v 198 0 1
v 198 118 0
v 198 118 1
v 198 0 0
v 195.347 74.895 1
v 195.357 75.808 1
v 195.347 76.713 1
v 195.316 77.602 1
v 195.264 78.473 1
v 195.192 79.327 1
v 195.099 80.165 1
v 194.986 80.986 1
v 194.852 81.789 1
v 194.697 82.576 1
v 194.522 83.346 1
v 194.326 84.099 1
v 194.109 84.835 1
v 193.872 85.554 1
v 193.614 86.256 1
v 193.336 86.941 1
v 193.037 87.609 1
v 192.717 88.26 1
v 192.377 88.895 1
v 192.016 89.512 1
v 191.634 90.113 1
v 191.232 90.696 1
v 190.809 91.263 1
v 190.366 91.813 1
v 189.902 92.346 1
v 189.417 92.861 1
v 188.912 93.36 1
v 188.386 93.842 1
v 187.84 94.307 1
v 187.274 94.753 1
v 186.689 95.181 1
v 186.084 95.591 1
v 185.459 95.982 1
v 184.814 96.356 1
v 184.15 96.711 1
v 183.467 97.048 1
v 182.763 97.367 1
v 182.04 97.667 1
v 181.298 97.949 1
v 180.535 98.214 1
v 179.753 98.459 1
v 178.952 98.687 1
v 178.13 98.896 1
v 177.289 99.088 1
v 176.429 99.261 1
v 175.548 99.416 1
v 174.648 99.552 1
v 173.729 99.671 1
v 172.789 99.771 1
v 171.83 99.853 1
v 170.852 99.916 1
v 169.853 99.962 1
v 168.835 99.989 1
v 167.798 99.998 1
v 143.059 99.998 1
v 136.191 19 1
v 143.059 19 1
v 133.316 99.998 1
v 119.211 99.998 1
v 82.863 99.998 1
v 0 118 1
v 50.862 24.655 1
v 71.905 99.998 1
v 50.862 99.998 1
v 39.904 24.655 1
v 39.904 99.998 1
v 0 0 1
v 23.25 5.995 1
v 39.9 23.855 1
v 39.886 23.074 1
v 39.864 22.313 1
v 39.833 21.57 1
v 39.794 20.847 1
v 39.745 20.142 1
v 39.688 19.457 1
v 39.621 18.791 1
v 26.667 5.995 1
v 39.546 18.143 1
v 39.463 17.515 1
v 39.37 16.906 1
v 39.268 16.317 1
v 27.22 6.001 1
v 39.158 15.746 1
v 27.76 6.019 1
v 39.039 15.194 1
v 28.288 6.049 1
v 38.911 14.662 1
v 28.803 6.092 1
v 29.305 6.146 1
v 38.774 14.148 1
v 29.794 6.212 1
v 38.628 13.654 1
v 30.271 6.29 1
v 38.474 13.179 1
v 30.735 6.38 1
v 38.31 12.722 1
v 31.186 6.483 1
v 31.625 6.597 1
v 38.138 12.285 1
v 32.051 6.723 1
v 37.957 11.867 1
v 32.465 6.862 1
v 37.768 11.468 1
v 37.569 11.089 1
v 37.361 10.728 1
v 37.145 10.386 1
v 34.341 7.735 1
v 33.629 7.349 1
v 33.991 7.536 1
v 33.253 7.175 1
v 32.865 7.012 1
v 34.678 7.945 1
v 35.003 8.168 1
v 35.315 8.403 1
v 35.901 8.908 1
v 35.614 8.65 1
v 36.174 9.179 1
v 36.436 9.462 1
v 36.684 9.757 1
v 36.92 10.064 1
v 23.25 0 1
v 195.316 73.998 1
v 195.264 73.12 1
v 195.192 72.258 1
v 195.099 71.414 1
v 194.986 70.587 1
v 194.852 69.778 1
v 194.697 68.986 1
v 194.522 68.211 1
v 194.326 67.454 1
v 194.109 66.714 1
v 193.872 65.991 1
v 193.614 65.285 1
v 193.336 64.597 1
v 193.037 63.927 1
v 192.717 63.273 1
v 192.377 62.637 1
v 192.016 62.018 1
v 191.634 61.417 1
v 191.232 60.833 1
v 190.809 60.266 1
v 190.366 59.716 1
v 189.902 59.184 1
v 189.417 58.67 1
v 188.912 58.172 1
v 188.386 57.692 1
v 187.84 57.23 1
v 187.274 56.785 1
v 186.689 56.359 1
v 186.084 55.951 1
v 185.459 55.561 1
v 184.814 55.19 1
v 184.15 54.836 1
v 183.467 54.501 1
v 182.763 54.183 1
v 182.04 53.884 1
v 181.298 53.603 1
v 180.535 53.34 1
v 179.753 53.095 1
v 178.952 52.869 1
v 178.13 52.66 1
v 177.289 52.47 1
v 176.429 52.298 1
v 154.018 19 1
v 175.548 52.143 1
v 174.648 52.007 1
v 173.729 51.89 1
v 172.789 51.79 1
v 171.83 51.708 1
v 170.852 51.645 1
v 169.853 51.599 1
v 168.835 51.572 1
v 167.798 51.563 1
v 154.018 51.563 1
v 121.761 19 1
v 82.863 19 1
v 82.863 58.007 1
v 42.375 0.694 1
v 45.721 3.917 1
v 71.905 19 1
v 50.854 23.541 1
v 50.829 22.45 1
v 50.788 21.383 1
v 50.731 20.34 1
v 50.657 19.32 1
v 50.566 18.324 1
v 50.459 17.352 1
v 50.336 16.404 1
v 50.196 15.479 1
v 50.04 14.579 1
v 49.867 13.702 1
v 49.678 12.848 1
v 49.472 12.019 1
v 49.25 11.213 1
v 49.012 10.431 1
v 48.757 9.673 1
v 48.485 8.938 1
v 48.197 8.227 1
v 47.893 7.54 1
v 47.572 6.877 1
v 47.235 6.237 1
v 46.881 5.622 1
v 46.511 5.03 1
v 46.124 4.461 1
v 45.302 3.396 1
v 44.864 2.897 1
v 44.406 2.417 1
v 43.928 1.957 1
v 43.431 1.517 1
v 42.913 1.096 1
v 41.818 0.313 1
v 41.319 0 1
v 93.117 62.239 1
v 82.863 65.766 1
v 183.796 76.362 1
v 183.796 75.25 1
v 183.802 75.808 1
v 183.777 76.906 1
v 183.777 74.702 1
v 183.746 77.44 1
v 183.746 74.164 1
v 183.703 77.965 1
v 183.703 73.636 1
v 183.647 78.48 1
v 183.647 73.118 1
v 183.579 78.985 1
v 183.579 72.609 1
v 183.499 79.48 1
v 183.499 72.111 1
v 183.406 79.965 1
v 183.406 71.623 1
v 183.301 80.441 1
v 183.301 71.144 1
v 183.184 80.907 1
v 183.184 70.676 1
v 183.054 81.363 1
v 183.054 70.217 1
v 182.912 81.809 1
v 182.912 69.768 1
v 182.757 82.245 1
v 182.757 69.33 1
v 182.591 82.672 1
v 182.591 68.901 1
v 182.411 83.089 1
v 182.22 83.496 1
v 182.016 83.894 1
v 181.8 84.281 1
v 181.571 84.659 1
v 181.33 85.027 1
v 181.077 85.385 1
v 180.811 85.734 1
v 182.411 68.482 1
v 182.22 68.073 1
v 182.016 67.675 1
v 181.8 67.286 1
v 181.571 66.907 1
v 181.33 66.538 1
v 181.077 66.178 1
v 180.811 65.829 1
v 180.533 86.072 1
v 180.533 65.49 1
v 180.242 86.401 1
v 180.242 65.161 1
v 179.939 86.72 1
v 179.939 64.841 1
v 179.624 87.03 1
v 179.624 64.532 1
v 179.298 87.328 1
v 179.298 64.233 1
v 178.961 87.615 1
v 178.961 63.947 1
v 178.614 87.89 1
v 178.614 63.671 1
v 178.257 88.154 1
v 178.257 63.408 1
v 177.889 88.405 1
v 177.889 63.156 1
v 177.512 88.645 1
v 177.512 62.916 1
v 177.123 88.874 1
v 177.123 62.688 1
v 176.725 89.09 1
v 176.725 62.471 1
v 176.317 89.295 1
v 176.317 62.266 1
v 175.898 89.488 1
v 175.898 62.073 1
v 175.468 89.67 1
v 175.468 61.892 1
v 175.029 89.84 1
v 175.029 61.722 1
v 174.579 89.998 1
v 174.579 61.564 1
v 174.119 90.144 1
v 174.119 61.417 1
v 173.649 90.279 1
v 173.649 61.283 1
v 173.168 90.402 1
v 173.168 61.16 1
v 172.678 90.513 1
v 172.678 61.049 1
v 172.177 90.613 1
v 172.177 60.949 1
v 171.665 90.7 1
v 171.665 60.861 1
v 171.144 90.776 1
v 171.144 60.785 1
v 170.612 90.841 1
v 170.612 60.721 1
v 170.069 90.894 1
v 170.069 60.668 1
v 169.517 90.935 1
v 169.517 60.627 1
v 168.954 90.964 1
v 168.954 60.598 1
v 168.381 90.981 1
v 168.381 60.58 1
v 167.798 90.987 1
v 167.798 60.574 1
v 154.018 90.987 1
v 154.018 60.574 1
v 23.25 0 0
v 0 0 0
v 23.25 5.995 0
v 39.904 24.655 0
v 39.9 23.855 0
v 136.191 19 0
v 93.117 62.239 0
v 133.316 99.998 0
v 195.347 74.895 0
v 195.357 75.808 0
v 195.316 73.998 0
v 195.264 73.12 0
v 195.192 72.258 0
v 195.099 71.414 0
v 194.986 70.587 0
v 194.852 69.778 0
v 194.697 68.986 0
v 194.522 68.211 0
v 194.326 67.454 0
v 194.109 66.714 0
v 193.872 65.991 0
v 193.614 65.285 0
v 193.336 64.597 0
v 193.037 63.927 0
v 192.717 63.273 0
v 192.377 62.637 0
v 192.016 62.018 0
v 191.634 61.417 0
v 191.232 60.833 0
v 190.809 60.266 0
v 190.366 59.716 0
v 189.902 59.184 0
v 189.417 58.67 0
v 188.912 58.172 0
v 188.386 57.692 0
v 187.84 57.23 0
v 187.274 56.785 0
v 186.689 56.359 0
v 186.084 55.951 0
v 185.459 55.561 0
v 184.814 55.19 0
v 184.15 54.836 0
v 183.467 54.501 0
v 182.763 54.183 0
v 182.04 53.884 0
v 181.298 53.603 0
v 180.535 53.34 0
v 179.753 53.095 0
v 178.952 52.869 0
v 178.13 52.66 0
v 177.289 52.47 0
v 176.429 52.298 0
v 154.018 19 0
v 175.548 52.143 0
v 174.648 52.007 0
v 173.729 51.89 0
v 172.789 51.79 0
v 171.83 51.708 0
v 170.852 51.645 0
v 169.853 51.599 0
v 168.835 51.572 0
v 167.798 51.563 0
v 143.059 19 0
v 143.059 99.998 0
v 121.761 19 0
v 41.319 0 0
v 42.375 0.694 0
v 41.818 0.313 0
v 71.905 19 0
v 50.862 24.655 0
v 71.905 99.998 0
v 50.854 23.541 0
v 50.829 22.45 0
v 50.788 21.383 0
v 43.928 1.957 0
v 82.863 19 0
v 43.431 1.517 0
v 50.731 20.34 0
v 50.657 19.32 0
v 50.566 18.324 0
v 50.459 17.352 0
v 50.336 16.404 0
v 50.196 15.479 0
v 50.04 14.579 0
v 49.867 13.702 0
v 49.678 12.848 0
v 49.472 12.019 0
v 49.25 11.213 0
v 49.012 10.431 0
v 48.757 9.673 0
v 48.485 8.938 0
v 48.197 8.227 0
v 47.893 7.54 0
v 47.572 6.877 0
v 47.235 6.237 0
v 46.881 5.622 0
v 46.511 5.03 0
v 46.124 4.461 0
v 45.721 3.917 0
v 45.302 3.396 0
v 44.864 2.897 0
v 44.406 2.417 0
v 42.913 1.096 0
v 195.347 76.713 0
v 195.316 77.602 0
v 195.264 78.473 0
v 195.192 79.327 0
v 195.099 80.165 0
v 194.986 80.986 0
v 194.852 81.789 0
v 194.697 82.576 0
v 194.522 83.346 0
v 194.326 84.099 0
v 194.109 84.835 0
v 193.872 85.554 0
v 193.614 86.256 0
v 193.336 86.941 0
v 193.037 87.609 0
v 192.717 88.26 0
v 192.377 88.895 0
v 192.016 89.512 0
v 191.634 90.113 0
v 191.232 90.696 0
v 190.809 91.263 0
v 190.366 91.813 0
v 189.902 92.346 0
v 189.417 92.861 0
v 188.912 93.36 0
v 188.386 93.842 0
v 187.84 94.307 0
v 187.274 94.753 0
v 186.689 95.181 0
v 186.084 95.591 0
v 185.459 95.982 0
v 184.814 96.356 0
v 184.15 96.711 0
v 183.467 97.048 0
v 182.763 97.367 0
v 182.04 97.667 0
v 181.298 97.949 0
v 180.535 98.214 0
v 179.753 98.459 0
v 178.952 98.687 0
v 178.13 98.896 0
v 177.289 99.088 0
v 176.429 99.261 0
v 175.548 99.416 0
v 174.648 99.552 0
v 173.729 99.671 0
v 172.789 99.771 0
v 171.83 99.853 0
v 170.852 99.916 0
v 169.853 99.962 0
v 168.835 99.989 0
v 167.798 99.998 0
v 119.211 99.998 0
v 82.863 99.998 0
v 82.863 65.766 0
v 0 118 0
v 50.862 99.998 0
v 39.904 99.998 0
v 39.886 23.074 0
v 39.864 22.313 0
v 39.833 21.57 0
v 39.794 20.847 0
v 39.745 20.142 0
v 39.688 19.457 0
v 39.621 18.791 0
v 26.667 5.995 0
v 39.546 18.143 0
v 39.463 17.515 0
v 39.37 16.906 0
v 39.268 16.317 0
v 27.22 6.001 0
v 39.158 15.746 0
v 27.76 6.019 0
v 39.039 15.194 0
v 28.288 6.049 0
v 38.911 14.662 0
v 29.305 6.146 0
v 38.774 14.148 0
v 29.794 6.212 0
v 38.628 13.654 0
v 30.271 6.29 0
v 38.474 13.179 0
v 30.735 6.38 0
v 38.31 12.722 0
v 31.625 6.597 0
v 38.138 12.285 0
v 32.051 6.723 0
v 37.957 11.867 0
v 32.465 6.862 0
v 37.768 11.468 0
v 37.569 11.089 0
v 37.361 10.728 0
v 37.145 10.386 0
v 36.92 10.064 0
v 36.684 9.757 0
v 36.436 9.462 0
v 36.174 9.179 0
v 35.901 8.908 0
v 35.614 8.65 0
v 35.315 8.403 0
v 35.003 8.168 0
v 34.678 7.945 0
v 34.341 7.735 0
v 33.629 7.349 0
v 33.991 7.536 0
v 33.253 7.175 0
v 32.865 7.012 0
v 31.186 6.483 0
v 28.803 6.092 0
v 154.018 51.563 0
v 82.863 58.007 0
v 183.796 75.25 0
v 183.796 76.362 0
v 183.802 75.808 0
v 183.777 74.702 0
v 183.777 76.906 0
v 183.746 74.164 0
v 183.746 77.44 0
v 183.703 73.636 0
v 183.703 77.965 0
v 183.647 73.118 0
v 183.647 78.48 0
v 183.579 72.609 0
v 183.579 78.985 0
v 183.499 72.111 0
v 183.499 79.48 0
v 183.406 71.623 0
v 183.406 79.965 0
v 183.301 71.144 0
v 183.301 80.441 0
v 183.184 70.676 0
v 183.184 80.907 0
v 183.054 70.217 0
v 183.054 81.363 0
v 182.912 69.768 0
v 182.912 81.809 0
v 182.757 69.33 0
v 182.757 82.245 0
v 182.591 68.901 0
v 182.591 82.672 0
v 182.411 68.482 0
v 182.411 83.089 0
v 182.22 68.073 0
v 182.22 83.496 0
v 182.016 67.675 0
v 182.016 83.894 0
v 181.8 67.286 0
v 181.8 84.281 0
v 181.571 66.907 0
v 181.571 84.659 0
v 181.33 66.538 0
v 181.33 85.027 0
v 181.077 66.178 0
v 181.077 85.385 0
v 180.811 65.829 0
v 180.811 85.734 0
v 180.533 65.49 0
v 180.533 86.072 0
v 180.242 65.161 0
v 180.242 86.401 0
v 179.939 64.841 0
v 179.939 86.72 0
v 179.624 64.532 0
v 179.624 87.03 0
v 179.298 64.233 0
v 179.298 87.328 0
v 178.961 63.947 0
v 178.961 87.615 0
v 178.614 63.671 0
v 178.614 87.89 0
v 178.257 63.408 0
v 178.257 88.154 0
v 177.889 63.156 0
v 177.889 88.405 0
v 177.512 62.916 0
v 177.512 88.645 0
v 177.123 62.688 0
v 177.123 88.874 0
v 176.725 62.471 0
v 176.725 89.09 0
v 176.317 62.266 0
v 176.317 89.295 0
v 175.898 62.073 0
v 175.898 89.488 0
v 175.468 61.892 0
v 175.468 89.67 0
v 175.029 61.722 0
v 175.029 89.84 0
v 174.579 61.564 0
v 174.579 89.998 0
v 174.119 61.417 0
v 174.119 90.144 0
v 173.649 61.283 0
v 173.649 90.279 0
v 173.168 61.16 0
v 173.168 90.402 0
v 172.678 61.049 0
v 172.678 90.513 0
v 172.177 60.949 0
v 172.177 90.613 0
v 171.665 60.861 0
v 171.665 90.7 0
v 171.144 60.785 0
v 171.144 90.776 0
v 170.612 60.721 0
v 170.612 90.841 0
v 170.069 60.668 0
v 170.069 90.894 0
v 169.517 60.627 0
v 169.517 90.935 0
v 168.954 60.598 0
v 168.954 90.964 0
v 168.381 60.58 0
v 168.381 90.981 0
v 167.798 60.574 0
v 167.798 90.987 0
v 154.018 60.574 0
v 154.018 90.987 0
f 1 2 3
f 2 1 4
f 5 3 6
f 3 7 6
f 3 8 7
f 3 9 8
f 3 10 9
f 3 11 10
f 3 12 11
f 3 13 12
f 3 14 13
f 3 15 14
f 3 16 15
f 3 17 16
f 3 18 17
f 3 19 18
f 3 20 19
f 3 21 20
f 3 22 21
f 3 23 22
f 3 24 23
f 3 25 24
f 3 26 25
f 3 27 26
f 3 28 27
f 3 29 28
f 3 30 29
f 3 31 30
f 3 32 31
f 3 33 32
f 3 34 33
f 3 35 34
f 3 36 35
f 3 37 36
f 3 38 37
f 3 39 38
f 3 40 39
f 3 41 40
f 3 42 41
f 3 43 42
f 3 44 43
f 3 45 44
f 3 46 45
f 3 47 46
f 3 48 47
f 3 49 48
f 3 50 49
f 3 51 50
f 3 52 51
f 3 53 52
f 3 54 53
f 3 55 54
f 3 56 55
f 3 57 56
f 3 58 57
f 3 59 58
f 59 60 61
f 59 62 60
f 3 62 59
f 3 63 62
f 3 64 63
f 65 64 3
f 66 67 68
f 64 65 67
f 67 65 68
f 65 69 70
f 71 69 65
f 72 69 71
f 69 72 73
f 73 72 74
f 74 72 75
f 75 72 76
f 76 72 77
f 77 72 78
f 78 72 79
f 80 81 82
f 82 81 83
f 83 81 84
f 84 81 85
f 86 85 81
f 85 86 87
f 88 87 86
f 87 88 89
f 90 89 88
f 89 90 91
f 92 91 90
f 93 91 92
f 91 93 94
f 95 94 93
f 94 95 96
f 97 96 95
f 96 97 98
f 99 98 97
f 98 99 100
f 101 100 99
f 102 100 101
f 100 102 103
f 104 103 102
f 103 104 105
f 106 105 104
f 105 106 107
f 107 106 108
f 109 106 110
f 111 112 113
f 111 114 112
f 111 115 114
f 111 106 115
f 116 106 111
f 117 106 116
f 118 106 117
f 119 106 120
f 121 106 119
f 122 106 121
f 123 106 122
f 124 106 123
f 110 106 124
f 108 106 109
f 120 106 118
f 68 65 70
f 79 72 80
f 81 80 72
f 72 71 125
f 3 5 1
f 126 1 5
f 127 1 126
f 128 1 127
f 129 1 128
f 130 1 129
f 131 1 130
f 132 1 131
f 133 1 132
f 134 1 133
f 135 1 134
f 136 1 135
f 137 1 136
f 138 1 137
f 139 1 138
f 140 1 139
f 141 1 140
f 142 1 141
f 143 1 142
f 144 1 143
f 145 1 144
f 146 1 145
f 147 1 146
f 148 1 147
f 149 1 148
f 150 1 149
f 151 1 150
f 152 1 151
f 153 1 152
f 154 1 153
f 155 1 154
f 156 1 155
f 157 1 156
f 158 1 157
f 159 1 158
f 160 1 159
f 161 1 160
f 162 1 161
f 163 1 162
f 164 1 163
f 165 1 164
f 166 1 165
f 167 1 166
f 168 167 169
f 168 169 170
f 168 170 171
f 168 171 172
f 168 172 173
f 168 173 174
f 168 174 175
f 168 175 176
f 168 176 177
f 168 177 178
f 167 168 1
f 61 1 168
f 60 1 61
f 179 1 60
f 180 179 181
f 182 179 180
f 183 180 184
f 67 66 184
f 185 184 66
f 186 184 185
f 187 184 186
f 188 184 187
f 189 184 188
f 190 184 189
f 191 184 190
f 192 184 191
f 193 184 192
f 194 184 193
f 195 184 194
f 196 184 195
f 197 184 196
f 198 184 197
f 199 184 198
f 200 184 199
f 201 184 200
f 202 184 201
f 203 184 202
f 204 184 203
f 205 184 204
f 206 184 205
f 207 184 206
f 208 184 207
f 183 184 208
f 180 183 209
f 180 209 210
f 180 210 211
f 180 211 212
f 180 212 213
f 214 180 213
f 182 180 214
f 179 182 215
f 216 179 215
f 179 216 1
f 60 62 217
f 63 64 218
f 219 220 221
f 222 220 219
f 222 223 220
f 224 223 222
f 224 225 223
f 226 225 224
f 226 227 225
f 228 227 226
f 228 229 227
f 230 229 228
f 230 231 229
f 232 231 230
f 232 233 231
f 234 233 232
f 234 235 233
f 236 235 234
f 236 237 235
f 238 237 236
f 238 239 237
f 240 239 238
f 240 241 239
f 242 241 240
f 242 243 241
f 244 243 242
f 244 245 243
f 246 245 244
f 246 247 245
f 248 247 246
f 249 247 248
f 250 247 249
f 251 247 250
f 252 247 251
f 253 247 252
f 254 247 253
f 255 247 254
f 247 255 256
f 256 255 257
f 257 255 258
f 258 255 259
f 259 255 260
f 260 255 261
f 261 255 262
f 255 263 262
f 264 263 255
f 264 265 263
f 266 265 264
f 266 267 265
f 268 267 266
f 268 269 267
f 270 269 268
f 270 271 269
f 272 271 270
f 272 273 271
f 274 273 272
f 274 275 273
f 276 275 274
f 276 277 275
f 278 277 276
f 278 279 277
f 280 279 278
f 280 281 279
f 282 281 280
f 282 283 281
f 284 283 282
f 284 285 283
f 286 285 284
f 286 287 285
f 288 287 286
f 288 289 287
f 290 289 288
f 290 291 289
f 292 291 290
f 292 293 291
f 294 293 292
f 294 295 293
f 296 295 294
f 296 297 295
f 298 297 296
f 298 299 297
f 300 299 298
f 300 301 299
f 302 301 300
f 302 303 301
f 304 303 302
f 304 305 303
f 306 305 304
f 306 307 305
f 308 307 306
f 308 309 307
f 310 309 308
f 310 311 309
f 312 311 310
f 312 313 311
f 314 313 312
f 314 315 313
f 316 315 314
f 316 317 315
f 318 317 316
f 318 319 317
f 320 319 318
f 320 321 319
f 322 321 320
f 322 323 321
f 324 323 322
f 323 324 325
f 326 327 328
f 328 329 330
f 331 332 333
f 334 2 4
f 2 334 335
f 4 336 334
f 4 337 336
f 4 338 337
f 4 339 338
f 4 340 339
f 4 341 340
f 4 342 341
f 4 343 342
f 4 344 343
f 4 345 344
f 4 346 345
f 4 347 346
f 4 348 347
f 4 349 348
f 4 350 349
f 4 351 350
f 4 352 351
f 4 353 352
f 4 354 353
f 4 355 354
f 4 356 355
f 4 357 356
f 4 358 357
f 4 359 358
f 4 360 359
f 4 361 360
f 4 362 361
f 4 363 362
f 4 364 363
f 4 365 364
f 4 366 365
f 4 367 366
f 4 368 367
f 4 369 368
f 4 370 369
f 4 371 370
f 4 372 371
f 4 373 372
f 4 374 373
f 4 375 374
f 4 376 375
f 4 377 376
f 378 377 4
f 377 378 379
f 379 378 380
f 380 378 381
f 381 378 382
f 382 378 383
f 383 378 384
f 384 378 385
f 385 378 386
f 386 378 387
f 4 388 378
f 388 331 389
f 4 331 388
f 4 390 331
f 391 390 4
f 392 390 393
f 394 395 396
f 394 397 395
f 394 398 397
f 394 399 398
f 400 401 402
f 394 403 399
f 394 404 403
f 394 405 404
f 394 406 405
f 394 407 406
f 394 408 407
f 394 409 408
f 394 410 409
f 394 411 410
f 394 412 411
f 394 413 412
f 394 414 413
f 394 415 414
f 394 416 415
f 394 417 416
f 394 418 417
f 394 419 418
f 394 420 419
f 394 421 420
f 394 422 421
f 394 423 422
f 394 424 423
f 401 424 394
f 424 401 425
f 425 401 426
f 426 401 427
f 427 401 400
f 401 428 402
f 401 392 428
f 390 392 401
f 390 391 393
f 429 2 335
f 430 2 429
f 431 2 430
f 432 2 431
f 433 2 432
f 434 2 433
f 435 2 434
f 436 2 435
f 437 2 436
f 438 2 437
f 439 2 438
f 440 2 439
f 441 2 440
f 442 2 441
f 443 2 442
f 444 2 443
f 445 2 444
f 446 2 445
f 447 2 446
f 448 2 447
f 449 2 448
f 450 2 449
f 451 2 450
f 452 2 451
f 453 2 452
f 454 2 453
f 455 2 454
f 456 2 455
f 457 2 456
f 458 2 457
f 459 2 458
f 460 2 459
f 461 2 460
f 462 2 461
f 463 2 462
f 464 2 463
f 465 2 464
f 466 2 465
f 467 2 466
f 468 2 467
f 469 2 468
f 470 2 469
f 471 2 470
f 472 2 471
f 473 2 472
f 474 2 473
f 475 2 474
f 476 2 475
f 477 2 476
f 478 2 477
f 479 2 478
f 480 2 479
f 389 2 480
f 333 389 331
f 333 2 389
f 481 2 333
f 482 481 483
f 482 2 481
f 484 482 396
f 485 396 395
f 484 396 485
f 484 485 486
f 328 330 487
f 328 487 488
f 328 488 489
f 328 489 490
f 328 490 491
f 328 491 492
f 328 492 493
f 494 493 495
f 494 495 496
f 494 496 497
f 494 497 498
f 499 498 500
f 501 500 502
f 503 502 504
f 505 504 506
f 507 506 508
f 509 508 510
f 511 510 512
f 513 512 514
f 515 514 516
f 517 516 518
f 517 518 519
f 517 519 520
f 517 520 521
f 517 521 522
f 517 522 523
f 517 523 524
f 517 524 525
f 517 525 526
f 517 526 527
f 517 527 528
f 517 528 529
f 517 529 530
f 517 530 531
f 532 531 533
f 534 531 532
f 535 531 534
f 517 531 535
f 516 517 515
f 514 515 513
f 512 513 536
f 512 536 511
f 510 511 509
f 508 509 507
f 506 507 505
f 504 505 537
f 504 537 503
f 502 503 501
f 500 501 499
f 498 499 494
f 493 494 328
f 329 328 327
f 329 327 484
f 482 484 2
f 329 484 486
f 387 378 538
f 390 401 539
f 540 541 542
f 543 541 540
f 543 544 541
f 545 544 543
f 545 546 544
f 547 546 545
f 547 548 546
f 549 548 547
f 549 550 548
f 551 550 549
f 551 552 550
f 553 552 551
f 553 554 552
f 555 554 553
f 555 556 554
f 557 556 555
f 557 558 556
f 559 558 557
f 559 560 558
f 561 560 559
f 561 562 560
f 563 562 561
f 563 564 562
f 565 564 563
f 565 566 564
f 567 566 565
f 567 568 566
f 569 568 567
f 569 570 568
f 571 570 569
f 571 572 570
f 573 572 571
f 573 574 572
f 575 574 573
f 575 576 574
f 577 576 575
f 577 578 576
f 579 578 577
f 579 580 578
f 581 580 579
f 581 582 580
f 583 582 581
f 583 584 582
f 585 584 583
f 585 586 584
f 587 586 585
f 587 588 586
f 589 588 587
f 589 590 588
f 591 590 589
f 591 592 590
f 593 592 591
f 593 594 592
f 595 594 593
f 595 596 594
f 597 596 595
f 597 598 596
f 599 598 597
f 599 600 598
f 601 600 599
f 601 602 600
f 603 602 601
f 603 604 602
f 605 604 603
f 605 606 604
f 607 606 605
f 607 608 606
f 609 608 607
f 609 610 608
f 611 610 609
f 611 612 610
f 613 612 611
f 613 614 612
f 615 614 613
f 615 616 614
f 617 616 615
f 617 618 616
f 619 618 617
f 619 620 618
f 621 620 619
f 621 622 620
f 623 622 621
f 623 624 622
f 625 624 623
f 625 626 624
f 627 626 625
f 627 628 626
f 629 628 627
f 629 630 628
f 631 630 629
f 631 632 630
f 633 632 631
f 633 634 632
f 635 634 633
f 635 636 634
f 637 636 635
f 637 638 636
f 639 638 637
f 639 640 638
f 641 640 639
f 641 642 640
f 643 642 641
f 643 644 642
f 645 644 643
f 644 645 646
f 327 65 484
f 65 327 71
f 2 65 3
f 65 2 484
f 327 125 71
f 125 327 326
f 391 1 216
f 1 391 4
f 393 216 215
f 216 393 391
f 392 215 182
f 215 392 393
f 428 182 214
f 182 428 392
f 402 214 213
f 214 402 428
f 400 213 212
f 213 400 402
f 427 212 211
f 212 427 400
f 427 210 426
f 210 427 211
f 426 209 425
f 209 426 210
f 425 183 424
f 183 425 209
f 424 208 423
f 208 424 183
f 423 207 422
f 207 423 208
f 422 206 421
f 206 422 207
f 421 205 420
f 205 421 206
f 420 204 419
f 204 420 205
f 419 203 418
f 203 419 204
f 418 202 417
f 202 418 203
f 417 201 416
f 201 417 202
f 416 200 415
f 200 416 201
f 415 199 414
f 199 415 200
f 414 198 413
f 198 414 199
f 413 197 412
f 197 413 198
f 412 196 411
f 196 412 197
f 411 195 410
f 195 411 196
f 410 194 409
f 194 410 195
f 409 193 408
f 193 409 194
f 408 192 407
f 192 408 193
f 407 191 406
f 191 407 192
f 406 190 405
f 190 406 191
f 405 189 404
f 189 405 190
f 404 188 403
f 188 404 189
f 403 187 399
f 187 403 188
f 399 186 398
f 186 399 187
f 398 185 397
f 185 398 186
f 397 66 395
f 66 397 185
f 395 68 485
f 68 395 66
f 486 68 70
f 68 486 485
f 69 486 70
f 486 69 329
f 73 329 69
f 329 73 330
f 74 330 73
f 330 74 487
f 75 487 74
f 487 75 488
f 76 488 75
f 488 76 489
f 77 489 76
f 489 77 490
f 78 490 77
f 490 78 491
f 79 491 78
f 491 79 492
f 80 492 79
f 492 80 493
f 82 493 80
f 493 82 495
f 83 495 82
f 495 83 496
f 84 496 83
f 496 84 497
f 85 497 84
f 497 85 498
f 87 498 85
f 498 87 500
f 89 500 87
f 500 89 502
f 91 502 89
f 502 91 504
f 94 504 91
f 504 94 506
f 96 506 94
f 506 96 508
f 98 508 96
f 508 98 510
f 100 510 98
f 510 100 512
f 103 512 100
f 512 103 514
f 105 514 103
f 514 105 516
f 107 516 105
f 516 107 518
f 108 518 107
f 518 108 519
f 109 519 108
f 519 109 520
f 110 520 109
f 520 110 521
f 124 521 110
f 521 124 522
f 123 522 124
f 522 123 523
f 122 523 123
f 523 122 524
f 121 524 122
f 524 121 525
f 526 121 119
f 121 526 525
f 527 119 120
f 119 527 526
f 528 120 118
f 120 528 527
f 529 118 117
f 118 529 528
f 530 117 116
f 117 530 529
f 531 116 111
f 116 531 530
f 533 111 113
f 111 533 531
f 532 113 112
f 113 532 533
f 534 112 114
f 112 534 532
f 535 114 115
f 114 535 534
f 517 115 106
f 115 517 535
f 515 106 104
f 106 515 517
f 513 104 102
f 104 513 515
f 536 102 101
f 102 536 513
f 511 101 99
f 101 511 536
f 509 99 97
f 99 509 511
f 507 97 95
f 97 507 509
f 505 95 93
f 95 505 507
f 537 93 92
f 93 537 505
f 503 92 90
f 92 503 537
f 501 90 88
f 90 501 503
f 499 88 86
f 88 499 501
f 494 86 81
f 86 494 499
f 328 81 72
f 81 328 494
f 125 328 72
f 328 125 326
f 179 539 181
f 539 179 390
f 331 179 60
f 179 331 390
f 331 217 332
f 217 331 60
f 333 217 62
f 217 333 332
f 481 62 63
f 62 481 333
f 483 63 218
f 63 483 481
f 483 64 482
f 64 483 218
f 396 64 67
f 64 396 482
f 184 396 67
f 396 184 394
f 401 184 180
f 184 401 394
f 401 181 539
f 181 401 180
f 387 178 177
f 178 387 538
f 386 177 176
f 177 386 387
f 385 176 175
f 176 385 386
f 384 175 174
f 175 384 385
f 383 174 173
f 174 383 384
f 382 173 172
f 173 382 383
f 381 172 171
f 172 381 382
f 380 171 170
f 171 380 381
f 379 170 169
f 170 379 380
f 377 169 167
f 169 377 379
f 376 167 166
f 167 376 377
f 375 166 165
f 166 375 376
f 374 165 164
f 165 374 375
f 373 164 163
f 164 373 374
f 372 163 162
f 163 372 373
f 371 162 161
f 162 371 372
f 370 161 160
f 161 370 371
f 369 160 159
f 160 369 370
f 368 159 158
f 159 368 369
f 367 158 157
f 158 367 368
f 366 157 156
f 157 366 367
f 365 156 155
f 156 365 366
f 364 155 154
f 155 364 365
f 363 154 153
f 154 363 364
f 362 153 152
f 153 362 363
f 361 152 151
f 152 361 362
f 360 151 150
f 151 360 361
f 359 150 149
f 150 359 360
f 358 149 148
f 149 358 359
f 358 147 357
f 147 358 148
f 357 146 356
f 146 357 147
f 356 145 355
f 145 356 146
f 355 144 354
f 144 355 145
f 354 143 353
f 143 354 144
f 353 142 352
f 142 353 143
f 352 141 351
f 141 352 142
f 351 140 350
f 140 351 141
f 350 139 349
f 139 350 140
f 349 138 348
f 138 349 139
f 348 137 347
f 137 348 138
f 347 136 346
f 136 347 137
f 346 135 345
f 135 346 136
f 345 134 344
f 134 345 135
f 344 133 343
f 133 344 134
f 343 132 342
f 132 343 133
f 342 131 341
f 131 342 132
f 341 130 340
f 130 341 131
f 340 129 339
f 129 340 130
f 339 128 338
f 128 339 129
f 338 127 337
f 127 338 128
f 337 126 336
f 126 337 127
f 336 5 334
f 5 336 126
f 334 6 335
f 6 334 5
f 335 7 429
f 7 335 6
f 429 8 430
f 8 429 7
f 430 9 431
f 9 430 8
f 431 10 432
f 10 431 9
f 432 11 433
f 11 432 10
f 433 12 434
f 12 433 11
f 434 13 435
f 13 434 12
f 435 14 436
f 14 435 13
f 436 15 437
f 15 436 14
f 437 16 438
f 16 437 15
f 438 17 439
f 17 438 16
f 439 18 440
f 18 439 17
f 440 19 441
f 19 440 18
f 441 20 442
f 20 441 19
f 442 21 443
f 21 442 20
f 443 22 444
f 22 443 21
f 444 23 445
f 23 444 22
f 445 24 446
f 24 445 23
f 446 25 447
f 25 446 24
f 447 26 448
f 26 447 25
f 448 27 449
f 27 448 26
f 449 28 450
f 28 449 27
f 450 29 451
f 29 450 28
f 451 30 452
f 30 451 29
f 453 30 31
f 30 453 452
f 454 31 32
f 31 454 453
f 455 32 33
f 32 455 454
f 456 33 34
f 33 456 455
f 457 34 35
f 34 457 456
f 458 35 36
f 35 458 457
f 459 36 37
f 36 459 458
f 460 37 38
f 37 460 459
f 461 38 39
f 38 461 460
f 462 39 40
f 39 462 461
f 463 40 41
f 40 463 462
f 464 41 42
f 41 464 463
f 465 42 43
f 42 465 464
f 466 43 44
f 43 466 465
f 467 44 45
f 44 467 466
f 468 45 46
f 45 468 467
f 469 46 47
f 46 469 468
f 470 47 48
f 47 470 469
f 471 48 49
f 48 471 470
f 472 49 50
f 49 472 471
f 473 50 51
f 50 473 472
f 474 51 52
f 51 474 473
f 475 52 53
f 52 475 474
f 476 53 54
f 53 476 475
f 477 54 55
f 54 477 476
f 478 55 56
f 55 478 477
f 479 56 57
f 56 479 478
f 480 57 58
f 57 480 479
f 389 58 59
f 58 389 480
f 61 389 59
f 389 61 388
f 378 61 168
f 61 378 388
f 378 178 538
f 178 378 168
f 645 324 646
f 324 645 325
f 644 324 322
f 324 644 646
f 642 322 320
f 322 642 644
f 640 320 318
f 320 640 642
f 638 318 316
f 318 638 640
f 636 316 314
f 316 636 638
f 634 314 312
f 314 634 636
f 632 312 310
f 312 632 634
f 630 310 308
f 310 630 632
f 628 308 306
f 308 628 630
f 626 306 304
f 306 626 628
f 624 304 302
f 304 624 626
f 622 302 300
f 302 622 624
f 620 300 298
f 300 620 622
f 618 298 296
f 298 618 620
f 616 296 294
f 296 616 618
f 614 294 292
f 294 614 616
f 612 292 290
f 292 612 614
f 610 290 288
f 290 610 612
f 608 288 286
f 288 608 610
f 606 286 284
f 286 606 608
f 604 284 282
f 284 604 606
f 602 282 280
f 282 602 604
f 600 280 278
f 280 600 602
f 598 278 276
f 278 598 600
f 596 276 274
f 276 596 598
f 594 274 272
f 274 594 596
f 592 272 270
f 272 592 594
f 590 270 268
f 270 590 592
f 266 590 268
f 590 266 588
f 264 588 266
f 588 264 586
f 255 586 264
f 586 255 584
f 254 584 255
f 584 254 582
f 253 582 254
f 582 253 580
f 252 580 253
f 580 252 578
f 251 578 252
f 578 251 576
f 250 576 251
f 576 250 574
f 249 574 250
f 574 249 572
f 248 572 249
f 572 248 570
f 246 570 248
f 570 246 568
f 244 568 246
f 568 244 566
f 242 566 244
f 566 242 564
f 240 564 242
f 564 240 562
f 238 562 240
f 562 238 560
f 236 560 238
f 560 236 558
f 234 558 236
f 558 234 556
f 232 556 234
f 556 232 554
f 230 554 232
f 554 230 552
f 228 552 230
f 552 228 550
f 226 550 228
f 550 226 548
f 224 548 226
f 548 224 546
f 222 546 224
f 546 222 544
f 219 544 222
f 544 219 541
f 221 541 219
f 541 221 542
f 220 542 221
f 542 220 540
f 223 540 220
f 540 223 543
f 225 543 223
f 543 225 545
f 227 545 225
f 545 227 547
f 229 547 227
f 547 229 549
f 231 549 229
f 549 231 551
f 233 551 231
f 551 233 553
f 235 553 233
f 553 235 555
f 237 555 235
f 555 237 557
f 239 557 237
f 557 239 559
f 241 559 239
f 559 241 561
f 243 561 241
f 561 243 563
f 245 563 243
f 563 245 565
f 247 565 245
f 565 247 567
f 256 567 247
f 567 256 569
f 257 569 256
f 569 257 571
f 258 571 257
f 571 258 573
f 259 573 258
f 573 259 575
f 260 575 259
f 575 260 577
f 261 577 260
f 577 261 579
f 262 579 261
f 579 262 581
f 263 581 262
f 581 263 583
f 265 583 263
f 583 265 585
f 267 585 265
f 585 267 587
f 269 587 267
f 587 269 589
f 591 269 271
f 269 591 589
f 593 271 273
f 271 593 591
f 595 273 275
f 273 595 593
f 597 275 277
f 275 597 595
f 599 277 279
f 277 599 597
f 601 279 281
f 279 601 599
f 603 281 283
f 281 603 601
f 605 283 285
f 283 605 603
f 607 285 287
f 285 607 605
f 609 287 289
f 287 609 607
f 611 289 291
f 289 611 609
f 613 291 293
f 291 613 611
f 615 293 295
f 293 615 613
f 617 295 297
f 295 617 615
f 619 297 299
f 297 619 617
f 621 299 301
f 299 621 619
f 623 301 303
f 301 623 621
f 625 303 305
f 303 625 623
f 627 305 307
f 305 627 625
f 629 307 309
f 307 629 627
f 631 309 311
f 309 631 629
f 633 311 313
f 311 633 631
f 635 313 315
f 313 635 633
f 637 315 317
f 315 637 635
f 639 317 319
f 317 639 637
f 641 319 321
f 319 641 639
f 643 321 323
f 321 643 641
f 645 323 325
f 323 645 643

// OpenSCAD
$fn=200;

size=80;

font="Solid Stencil 2023";
text="JKP";
xpadding=10;

padding=19;

font_w= size*2;
font_h = size;

width=font_w+2*padding;
height=font_h+2*padding;

echo(width,height);
thickness=1;



difference() {
cube([width, height,thickness]);

translate([xpadding + width/2-font_w/2, height/2 - font_h/2   ,- thickness])
linear_extrude(height = 11)
    text(text, font=font, size=size);
}
